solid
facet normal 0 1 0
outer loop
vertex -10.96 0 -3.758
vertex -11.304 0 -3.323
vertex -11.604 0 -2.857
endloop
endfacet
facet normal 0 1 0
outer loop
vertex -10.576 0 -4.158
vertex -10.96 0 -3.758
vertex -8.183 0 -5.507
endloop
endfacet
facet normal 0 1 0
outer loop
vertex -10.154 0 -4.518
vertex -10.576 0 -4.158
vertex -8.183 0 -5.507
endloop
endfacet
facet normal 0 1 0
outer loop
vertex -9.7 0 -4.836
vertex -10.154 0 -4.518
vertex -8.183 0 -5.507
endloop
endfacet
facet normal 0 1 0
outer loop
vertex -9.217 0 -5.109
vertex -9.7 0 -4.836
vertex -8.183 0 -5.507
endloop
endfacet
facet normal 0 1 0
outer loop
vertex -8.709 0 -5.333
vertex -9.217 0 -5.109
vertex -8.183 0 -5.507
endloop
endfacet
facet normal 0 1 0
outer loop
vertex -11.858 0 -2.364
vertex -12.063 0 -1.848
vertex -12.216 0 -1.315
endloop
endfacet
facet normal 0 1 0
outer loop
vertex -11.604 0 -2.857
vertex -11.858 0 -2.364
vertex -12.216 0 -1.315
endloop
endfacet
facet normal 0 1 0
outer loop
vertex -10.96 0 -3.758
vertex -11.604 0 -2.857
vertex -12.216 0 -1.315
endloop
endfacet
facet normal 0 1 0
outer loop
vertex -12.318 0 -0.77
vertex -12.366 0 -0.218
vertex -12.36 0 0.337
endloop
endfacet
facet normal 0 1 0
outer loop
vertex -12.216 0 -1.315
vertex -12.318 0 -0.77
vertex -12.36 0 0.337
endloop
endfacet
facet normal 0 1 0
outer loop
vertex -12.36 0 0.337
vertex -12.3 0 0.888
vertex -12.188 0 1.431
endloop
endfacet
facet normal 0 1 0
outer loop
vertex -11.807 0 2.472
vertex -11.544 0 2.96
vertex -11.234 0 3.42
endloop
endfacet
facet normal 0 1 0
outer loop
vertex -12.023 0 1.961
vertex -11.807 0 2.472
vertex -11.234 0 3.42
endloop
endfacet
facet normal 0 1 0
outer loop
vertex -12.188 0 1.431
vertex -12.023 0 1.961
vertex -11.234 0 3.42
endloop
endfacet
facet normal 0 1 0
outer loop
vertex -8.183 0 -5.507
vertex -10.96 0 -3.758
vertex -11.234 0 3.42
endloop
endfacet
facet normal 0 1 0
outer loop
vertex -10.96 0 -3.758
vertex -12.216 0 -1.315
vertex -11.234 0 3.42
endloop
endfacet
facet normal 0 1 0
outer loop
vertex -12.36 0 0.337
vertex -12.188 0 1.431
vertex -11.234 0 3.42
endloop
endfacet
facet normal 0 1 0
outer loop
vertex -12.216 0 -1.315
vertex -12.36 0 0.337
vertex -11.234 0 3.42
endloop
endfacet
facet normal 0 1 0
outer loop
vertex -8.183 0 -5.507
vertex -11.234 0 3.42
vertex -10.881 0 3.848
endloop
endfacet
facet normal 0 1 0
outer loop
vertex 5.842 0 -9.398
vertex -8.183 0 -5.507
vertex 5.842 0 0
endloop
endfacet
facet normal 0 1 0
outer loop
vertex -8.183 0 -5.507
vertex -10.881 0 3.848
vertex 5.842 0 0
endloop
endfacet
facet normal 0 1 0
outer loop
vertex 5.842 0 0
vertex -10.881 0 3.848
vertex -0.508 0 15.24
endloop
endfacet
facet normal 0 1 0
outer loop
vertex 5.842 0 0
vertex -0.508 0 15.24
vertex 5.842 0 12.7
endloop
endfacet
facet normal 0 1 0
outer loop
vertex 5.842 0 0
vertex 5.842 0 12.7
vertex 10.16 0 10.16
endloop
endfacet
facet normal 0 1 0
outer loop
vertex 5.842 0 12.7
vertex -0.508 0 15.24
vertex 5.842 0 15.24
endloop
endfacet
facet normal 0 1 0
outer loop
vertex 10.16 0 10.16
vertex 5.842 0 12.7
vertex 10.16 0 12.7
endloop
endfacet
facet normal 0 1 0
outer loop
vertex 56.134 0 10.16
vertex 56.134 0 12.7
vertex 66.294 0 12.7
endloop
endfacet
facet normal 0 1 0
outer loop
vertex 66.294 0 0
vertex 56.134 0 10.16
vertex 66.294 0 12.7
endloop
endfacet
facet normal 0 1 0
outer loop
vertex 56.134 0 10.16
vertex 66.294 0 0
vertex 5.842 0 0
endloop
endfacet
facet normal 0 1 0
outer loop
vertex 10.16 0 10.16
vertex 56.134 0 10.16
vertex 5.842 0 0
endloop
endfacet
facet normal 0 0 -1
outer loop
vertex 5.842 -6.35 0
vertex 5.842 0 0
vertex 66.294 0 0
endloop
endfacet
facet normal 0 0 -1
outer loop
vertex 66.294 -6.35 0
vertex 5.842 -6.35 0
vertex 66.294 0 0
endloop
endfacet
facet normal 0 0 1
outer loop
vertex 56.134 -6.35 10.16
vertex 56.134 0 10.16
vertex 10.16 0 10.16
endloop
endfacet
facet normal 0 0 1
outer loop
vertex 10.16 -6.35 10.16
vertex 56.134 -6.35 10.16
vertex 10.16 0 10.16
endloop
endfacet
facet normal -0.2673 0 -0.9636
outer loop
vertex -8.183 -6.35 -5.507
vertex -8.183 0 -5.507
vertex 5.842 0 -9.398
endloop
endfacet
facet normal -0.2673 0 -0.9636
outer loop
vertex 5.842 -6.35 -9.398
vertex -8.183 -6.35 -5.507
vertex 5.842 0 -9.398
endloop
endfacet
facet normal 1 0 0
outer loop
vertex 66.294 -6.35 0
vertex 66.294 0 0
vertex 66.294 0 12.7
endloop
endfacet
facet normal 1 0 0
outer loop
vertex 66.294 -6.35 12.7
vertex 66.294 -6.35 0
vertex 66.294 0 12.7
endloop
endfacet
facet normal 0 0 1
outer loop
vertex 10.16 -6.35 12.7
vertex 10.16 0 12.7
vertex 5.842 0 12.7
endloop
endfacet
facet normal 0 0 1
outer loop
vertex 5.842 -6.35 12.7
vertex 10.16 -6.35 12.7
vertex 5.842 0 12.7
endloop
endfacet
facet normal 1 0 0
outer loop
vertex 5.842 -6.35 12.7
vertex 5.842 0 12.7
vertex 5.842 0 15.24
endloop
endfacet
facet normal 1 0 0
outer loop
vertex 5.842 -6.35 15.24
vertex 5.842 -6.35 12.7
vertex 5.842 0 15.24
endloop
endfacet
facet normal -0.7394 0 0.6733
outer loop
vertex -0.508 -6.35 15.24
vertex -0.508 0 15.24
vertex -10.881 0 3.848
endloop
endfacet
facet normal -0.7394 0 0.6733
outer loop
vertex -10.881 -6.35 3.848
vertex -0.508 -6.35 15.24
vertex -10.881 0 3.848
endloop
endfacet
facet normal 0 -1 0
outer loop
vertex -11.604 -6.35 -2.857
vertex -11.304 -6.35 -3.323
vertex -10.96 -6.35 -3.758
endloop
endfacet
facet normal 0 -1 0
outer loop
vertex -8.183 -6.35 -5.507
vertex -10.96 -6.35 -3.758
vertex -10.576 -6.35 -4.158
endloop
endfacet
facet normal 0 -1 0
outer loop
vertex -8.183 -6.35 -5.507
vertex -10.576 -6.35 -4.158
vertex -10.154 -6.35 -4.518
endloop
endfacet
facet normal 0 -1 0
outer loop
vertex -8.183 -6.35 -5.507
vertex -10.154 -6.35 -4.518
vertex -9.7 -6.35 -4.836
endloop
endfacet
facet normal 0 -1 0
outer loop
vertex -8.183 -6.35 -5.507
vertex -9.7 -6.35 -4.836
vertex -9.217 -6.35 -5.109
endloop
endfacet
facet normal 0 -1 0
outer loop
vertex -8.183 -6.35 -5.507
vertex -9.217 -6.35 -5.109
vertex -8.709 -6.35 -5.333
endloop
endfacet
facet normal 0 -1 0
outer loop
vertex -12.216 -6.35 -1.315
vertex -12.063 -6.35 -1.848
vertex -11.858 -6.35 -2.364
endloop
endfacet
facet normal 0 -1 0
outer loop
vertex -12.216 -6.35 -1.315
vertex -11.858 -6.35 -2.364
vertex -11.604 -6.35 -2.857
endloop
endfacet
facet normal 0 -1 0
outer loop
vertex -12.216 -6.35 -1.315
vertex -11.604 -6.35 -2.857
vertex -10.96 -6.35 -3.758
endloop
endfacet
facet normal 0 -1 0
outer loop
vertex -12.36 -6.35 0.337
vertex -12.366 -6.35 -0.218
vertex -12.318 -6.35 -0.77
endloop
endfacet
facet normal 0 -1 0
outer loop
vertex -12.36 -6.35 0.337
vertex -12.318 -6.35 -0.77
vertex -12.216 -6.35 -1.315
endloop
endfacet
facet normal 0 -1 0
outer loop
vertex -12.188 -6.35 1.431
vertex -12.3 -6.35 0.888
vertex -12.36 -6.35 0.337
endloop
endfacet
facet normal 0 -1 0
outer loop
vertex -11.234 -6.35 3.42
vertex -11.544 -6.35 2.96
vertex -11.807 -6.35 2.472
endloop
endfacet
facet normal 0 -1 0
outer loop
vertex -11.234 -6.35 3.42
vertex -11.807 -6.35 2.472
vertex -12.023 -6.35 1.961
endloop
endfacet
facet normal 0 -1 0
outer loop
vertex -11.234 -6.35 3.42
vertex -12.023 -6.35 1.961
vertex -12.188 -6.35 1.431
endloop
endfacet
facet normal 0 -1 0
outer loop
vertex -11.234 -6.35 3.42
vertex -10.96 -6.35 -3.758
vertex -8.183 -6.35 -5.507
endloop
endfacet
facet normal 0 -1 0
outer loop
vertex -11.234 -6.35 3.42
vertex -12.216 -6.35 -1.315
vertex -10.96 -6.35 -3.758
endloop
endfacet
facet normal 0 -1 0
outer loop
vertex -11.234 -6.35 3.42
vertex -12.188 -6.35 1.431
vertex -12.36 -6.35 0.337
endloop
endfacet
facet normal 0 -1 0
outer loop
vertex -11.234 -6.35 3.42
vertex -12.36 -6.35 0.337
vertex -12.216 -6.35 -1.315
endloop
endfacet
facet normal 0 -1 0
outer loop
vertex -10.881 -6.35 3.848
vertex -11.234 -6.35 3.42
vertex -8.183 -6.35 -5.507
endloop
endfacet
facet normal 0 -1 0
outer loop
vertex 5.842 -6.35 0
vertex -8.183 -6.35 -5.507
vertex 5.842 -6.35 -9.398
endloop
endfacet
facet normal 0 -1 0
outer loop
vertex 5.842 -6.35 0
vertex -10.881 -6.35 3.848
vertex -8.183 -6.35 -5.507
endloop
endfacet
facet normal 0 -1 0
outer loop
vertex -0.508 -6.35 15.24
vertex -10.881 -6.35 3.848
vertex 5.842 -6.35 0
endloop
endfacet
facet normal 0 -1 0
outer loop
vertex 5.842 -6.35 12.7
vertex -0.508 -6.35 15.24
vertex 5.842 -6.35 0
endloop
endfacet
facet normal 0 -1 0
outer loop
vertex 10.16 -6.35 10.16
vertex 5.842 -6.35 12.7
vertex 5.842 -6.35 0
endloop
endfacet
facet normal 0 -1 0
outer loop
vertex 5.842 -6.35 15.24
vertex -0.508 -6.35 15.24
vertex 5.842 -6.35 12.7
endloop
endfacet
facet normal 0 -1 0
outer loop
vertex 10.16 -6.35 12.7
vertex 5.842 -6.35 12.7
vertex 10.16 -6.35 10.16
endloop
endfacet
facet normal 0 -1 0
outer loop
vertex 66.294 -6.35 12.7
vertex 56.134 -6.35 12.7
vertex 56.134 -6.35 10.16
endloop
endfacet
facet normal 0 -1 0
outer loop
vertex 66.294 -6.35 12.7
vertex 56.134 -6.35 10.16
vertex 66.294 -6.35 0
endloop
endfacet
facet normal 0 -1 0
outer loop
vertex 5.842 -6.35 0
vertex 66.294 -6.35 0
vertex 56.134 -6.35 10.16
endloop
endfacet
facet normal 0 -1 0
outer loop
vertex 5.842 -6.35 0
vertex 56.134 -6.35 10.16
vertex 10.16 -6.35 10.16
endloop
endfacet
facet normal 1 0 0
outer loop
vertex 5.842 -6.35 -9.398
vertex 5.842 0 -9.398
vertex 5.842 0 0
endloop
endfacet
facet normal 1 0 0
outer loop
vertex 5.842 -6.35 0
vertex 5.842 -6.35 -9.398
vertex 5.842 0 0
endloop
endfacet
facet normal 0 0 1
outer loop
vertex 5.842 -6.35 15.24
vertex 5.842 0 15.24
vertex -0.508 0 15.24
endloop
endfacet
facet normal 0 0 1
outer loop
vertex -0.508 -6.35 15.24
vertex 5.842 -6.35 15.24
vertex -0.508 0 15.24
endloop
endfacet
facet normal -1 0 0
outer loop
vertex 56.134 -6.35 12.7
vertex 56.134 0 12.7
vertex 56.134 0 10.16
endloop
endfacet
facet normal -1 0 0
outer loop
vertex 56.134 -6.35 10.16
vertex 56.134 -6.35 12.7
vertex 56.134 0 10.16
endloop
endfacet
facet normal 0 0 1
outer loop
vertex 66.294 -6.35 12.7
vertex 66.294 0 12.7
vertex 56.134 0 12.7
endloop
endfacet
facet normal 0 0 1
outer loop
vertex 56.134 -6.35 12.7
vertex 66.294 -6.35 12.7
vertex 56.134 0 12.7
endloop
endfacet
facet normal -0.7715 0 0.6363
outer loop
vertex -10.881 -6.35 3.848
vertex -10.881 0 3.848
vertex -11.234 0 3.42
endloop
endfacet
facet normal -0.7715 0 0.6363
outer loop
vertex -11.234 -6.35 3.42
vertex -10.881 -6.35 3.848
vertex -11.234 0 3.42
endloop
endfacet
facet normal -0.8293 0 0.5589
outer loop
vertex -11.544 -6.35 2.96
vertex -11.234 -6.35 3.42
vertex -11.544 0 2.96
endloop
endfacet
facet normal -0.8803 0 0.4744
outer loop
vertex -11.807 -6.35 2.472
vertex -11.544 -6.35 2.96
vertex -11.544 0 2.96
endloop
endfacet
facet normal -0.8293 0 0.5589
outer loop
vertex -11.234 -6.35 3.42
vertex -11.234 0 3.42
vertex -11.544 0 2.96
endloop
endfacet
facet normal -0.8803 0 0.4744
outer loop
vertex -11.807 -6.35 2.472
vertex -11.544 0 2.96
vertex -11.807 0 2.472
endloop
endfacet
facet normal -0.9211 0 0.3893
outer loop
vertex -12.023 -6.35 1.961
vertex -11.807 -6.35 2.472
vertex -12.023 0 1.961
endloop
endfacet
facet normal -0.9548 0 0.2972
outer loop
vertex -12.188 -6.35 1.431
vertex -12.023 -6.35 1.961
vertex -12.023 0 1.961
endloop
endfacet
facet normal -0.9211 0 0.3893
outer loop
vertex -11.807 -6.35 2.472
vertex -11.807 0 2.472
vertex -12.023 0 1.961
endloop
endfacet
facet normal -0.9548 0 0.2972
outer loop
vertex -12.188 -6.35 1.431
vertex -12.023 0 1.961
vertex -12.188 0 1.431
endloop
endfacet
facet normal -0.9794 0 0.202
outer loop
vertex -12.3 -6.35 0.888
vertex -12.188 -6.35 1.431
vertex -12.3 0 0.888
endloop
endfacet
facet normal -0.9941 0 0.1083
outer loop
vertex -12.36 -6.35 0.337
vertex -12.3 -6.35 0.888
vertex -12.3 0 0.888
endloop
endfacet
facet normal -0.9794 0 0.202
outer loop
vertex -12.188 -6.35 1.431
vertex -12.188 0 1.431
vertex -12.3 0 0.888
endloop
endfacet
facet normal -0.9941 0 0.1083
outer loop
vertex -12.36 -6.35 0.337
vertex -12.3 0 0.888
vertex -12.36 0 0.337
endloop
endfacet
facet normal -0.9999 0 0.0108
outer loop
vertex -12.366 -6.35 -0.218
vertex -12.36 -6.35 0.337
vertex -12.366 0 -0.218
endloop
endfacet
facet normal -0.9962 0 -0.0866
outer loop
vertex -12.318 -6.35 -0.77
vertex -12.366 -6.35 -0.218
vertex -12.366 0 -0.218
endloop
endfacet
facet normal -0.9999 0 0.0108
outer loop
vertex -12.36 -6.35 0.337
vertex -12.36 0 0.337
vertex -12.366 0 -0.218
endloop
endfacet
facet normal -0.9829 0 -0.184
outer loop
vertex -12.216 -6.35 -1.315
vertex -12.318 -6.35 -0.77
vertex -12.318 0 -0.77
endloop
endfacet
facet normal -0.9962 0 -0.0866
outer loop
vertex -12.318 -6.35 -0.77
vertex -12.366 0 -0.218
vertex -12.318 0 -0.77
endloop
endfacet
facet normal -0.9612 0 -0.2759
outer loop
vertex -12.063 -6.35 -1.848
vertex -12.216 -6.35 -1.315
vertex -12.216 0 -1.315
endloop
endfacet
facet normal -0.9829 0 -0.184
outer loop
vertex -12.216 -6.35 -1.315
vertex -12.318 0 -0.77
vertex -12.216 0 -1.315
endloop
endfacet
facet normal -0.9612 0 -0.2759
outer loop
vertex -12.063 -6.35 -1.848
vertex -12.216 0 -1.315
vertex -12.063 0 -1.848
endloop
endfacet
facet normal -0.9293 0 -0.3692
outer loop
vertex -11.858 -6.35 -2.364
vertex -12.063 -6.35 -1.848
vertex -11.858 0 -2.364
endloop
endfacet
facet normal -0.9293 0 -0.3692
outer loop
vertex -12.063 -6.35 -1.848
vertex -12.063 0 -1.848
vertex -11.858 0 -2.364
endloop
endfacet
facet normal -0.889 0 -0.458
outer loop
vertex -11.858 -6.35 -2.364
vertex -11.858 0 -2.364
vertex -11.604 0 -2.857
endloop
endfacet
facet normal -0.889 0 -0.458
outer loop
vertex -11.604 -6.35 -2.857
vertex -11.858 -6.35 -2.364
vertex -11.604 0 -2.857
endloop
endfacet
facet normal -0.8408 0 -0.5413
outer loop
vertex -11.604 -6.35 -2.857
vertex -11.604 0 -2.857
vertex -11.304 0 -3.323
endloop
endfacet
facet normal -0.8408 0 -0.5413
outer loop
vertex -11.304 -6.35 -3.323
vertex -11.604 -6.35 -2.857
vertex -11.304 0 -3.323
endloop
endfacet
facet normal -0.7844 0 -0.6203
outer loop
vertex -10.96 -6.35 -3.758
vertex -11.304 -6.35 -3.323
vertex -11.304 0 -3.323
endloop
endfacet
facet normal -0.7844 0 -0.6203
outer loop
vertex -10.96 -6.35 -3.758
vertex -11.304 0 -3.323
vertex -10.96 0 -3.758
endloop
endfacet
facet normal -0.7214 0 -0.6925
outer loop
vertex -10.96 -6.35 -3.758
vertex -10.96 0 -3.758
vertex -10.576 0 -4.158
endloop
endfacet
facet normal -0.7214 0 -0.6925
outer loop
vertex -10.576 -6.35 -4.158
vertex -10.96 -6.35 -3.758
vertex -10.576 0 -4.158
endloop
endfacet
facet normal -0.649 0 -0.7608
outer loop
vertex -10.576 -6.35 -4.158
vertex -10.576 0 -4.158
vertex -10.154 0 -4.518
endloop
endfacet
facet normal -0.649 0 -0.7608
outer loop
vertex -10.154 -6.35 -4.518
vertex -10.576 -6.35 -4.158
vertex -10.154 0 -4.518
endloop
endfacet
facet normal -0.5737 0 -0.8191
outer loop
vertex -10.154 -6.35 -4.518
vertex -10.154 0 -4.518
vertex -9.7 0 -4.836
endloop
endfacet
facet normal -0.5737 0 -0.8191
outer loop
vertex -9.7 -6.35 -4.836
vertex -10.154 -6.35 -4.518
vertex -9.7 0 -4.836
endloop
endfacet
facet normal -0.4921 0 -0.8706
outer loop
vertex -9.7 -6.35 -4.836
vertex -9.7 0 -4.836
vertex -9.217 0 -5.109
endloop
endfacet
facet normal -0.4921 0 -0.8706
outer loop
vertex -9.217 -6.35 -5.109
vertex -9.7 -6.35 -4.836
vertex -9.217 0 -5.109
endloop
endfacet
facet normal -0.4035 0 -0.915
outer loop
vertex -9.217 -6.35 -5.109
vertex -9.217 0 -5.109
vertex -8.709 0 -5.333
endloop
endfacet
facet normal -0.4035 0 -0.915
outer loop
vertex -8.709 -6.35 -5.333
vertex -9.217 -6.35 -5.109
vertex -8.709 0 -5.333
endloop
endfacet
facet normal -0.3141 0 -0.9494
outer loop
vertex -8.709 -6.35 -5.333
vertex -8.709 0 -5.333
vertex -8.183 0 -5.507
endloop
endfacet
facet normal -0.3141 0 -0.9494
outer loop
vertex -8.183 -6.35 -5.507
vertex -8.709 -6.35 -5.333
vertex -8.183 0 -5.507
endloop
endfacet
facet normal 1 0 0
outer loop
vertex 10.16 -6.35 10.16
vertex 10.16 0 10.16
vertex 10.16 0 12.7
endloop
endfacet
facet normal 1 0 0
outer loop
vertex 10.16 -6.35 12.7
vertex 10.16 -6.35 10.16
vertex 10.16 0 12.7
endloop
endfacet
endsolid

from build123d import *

# Parameters (mm, degrees)
F0_R     = 3.175
F0_W     = 5.842
F0_H     = 12.7
F1_DEPTH = 6.35
F2_DEPTH = 3.048


with BuildPart() as f1:
    # F0 (on Front) → F1 (new body)
    with BuildSketch(Plane.XZ):
        with BuildLine():
            Line((5.842, 0), (0, 0))
            Line((0, 0), (-0.9398, 0))
            ThreePointArc((-0.9398, 0), (-3.195791, -4.549339), (-8.182663, -5.506983))
            Line((-8.182663, -5.506983), (5.842, -9.398))
            Line((5.842, -9.398), (5.842, 0))
        make_face()
        with BuildLine():
            Line((-0.9398, 0), (0, 0))
            Line((0, 0), (0, 12.7))
            Line((0, 12.7), (5.842, 12.7))
            Line((5.842, 12.7), (5.842, 15.24))
            Line((5.842, 15.24), (-0.508, 15.24))
            Line((-0.508, 15.24), (-10.88063, 3.847543))
            ThreePointArc((-10.88063, 3.847543), (-4.591961, 5.329721), (-0.9398, 0))
        make_face()
        with BuildLine():
            ThreePointArc((-8.182663, -5.506983), (-3.195791, -4.549339), (-0.9398, 0))
            ThreePointArc((-0.9398, 0), (-4.591961, 5.329721), (-10.88063, 3.847543))
            ThreePointArc((-10.88063, 3.847543), (-12.145978, -1.583727), (-8.182663, -5.506983))
        make_face()
        with Locations((-6.6548, 0)):
            Circle(F0_R, mode=Mode.SUBTRACT)
        Polygon((5.842, 12.7), (5.842, 0), (66.294, 0), (66.294, 12.7), (56.134, 12.7), (56.134, 10.16), (10.16, 10.16), (10.16, 12.7), align=None)
        with Locations((2.921, 6.35)):
            Rectangle(F0_W, F0_H)
        with Locations((-6.6548, 0)):
            Circle(F0_R)
    extrude(amount=F1_DEPTH)

    # F0 (on Front) → F2 (join)
    with BuildSketch(Plane.XZ):
        with Locations((-6.6548, 0)):
            Circle(F0_R)
        with BuildLine():
            ThreePointArc((-8.182663, -5.506983), (-3.195791, -4.549339), (-0.9398, 0))
            ThreePointArc((-0.9398, 0), (-4.591961, 5.329721), (-10.88063, 3.847543))
            ThreePointArc((-10.88063, 3.847543), (-12.145978, -1.583727), (-8.182663, -5.506983))
        make_face()
        with Locations((-6.6548, 0)):
            Circle(F0_R, mode=Mode.SUBTRACT)
    extrude(amount=F2_DEPTH)


solid = f1.part
